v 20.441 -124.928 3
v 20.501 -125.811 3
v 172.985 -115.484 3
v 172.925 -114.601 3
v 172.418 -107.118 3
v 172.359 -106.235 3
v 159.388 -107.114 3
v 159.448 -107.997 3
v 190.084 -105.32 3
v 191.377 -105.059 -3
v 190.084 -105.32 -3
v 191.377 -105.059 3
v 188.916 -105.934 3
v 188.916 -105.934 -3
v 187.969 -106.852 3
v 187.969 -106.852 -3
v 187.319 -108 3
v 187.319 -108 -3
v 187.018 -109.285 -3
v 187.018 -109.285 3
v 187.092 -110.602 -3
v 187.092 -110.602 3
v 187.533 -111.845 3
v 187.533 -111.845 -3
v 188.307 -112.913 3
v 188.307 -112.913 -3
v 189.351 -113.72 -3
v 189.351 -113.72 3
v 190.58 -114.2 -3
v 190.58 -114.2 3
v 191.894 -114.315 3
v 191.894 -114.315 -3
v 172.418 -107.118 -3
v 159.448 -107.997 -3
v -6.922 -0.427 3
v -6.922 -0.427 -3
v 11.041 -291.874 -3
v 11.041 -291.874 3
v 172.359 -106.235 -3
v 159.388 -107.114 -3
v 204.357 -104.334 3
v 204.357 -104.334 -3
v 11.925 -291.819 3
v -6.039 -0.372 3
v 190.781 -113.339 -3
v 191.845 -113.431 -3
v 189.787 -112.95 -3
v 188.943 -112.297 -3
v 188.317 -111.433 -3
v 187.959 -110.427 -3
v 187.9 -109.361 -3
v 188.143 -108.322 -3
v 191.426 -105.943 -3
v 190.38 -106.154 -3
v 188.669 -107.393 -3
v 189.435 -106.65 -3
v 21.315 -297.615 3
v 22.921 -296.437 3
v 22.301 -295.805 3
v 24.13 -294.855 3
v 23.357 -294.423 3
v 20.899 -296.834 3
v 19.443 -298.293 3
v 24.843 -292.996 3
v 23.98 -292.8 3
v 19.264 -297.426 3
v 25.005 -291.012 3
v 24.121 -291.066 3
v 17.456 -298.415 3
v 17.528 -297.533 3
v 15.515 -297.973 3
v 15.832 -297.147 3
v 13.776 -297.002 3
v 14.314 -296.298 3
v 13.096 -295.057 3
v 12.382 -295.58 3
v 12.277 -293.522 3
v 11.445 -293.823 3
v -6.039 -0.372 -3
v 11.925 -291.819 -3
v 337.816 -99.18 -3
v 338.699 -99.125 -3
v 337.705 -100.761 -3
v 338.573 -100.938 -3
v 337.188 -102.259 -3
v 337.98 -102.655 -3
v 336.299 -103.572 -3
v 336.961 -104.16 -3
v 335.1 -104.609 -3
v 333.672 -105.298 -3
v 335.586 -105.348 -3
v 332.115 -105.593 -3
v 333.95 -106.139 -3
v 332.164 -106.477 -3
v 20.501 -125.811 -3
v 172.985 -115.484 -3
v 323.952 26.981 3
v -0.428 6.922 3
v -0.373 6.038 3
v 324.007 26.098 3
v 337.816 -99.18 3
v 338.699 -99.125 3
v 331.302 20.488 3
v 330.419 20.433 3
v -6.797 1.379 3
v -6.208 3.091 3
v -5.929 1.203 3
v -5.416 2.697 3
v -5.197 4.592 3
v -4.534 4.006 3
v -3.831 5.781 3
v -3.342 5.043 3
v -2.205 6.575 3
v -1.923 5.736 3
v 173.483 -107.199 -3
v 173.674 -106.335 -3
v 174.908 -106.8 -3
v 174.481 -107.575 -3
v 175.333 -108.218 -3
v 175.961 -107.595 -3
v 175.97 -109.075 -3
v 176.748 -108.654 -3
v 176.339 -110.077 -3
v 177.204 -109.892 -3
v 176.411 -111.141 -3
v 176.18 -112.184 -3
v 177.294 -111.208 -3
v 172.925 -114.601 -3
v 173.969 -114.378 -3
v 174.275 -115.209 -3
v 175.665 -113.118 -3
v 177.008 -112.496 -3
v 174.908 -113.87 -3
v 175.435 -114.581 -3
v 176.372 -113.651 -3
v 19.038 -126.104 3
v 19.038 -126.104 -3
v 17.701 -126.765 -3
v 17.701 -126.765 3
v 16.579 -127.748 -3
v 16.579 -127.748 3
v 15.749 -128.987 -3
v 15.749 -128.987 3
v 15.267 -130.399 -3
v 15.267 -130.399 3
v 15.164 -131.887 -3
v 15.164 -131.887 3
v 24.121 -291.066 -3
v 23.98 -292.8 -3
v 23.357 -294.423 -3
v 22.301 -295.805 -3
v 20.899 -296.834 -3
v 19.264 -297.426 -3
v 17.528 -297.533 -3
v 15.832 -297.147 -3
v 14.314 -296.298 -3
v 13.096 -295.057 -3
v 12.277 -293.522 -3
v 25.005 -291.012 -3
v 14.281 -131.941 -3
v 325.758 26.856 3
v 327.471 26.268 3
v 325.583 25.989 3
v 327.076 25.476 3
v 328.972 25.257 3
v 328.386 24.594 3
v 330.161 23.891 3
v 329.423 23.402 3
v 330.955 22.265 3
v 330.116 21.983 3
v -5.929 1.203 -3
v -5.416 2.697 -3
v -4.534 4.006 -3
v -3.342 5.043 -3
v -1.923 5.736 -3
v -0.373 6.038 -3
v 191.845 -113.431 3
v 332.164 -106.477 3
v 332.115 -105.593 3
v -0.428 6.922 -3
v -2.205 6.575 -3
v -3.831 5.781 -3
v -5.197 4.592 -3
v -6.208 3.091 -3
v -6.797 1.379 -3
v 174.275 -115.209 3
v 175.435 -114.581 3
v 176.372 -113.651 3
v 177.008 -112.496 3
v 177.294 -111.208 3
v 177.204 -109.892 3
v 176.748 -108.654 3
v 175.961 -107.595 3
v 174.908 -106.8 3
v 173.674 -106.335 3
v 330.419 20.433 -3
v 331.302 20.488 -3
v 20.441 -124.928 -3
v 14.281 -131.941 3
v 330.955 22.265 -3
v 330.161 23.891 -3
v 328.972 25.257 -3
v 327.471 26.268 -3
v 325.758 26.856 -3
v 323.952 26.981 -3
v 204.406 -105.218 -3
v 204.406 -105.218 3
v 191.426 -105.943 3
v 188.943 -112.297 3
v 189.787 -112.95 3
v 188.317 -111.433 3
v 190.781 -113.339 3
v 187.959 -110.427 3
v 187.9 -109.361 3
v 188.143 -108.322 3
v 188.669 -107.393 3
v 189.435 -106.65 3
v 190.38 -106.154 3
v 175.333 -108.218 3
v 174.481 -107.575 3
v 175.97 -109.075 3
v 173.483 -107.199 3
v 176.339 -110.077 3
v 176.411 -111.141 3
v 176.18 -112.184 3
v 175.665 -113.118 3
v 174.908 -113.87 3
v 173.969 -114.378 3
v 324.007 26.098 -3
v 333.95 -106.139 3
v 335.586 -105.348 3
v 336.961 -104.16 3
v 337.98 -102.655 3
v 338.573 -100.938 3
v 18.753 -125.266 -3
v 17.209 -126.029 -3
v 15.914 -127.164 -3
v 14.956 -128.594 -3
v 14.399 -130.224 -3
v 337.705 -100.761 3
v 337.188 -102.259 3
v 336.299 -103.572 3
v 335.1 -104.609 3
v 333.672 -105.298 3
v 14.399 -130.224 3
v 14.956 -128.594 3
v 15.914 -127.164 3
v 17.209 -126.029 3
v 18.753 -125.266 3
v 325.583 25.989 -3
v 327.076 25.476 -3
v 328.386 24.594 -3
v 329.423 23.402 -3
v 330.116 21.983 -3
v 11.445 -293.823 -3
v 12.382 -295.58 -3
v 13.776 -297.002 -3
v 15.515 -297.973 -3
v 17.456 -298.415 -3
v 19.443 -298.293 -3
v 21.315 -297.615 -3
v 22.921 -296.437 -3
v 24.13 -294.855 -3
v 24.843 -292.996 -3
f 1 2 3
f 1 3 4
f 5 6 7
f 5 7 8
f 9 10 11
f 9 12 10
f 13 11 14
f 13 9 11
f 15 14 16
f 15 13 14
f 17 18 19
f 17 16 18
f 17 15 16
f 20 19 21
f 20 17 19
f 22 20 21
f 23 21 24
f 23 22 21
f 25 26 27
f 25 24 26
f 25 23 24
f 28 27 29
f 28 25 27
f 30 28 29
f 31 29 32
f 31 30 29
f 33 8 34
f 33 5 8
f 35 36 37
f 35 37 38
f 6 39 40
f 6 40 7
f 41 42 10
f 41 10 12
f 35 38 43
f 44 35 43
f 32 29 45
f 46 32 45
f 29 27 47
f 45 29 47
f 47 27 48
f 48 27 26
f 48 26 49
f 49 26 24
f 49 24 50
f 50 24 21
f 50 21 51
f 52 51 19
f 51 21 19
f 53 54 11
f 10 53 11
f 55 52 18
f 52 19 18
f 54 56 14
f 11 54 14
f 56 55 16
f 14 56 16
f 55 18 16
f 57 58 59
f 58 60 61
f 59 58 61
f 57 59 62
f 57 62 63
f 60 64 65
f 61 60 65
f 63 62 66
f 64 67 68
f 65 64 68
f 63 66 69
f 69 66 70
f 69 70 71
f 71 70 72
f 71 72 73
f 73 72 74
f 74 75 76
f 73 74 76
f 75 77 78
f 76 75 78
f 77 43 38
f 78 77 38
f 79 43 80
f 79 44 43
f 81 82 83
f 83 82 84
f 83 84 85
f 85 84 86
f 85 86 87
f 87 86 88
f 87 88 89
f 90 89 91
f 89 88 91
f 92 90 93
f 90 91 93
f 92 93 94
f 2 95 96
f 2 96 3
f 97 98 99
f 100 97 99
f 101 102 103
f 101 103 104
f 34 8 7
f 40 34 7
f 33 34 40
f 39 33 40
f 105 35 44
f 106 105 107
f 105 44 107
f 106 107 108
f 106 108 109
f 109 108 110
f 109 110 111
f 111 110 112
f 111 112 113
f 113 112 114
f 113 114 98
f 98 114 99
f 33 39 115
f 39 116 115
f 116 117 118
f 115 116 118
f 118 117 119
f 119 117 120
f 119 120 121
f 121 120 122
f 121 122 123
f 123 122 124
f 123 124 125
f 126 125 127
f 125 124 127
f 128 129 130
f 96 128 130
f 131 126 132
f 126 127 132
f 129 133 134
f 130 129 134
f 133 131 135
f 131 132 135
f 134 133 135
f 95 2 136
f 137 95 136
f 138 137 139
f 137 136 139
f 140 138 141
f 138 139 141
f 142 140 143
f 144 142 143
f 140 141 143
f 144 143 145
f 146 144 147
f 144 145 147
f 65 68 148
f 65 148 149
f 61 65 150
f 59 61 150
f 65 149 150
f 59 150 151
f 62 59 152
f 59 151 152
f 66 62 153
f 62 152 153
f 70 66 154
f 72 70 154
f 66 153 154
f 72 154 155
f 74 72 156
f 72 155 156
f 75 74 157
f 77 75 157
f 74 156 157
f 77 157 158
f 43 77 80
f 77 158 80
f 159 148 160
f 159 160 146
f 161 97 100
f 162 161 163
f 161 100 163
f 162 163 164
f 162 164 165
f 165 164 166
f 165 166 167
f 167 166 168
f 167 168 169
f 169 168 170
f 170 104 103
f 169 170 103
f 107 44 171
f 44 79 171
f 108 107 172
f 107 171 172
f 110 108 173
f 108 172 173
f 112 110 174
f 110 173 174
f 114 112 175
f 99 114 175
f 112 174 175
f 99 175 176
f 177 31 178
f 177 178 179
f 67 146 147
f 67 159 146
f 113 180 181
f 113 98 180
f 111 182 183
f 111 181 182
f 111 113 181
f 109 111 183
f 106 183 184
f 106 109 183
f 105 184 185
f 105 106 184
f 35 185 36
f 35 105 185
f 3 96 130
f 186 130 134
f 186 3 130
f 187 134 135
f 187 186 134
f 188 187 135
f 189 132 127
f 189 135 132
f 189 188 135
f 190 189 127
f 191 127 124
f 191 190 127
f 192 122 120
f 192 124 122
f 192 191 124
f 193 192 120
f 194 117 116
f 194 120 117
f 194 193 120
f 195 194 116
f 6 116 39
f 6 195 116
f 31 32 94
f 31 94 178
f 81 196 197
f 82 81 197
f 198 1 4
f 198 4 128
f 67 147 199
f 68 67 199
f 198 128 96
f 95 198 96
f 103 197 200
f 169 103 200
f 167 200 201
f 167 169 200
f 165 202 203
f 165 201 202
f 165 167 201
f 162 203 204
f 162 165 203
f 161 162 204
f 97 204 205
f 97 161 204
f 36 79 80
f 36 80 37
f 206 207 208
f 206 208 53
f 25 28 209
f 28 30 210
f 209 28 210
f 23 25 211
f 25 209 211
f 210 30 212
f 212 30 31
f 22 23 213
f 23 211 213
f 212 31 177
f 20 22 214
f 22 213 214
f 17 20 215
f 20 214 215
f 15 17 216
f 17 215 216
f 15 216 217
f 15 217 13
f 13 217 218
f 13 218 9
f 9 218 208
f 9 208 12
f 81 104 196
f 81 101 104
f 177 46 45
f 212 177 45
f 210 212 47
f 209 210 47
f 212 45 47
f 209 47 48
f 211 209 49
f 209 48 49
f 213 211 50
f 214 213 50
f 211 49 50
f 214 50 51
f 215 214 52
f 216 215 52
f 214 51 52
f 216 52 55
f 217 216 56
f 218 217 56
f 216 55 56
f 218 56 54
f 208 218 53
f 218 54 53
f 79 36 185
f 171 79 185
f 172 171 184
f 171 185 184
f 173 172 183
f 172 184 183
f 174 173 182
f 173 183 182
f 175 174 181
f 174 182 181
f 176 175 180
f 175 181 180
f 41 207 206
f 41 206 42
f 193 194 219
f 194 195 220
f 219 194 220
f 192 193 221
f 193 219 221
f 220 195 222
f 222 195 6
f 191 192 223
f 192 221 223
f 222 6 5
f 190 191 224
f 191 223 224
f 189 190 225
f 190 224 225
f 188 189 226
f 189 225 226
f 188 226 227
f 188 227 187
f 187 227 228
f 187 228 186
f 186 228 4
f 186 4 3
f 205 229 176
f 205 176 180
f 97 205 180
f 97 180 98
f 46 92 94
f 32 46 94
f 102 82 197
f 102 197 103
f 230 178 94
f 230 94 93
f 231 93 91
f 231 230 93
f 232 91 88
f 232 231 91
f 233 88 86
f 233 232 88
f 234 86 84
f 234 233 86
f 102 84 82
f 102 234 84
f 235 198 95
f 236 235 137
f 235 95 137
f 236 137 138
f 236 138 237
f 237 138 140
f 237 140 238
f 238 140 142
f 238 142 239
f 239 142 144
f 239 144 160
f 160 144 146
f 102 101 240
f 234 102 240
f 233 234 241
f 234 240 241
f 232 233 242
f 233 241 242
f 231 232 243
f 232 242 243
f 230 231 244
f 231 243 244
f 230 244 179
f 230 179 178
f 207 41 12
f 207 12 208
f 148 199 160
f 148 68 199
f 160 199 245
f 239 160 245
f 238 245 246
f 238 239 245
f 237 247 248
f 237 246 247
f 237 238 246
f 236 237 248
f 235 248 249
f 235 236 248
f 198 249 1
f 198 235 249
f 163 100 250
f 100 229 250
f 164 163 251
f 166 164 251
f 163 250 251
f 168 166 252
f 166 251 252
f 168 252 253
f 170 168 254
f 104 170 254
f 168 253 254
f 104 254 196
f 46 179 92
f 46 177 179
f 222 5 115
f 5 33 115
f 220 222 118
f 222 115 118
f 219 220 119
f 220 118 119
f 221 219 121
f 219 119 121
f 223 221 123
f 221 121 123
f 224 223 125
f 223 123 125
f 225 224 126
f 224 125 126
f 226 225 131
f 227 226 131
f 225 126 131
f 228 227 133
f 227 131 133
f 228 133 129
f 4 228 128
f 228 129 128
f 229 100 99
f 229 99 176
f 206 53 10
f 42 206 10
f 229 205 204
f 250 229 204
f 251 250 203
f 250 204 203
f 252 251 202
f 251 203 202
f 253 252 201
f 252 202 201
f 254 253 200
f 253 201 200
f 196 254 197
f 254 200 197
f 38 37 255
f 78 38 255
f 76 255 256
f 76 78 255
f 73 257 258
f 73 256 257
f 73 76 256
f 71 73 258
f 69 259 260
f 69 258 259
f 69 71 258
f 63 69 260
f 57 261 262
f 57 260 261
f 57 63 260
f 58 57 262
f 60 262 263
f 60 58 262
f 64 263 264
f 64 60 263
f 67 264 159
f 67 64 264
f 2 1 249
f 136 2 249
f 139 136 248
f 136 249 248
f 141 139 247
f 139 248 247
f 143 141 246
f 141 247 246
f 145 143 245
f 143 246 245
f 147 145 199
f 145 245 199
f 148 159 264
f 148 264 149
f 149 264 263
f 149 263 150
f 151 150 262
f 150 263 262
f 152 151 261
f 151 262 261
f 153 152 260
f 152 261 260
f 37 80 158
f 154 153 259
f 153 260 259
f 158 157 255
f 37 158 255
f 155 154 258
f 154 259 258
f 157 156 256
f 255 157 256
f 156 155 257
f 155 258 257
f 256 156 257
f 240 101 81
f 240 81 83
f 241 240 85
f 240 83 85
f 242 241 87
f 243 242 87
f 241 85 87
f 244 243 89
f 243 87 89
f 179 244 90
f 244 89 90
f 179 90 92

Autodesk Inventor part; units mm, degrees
ref_plane "YZ Plane" through (0, 0, 0) normal (1, 0, 0) x (0, 1, 0)
ref_plane "XZ Plane" through (0, 0, 0) normal (0, 1, 0) x (-1, 0, 0)
sketch "Sketch1" plane through (0, 0, 0) normal (0, 0, 1) x (1, 0, 0)
  circle A0 centre (0, 0) radius 6.05
surface extrude "ExtrusionSrf1" sketch "Sketch1" along normal mid plane 6 shown yes curves A0
sketch "Sketch2" plane through (0, 0, 0) normal (0, 0, 1) x (1, 0, 0)
  circle A0 centre (324.3803, 20.0598) radius 6.05
  point P0 (0, 0)
surface extrude "ExtrusionSrf2" sketch "Sketch2" along normal mid plane 6 shown yes curves A0
sketch "Sketch3" plane through (0, 0, 0) normal (0, 0, 1) x (1, 0, 0)
  circle A0 centre (18.0229, -291.4433) radius 6.11
  point P0 (0, 0)
surface extrude "ExtrusionSrf3" sketch "Sketch3" along normal blind 6 shown yes curves A0
sketch "Sketch4" plane through (0, 0, 0) normal (0, 0, 1) x (1, 0, 0)
  circle A0 centre (20.8883, -131.5327) radius 5.735
  point P0 (0, 0)
surface extrude "ExtrusionSrf4" sketch "Sketch4" along normal mid plane 6 shown yes curves A0
sketch "Sketch5" plane through (0, 0, 0) normal (0, 0, 1) x (1, 0, 0)
  circle A0 centre (331.7772, -99.5529) radius 6.05
  point P0 (0, 0)
surface extrude "ExtrusionSrf5" sketch "Sketch5" along normal mid plane 6 shown yes curves A0
sketch "Sketch6" plane through (0, 0, 0) normal (0, 0, 1) x (1, 0, 0)
  circle A0 centre (172.6717, -110.8599) radius 3
  point P0 (0, 0)
surface extrude "ExtrusionSrf6" sketch "Sketch6" along normal mid plane 6 shown yes curves A0
sketch "Sketch7" plane through (0, 0, 0) normal (0, 0, 1) x (1, 0, 0)
  circle A0 centre (191.6355, -109.6871) radius 3
  point P0 (0, 0)
surface extrude "ExtrusionSrf7" sketch "Sketch7" along normal mid plane 6 shown yes curves A0
sketch "Sketch8" plane through (0, 0, 0) normal (0, 0, 1) x (1, 0, 0)
  circle A0 centre (0, 0) radius 6.05 projected
  circle A1 centre (20.8883, -131.5327) radius 5.735 projected
  circle A2 centre (18.0229, -291.4433) radius 6.11 projected
  circle A3 centre (172.6717, -110.8599) radius 3 projected
  circle A4 centre (191.6355, -109.6871) radius 3 projected
  circle A5 centre (331.7772, -99.5529) radius 6.05 projected
  circle A6 centre (324.3803, 20.0598) radius 6.05 projected
  arc A7 (-0.3892, 6.293) -> (-6.2931, -0.3879) centre (0, 0) ccw
  arc A8 (11.67, -291.8348) -> (24.3758, -291.0504) centre (18.0229, -291.4433) ccw
  arc A9 (20.4583, -125.1822) -> (14.5355, -131.9256) centre (20.8883, -131.5327) ccw
  arc A10 (172.9424, -114.8557) -> (172.4011, -106.864) centre (172.6717, -110.8599) ccw
  arc A11 (330.6733, 20.4489) -> (323.9912, 26.3527) centre (324.3803, 20.0598) ccw
  arc A12 (191.4121, -105.6884) -> (191.859, -113.6859) centre (191.6355, -109.6871) ccw
  arc A13 (332.129, -105.8481) -> (338.0702, -99.1638) centre (331.7772, -99.5529) ccw
  line L0 (11.67, -291.8348) -> (-6.2931, -0.3879)
  line L1 (-0.3892, 6.293) -> (323.9912, 26.3527)
  line L2 (24.3758, -291.0504) -> (14.5355, -131.9256)
  line L3 (20.4583, -125.1822) -> (172.9424, -114.8557)
  line L4 (330.6733, 20.4489) -> (338.0702, -99.1638)
  line L5 (159.4309, -107.7424) -> (172.4011, -106.864)
  line L6 (191.859, -113.6859) -> (332.129, -105.8481)
  line L7 (191.4121, -105.6884) -> (204.3918, -104.9631)
  dimension "d14" = 0.255
  dimension "d15" = 0.255
  dimension "d16" = 0.255
  dimension "d17" = 0.63
  dimension "d19" = 0.255
  dimension "d22" = 1.005
  dimension "d23" = 1.005
  dimension "d34" = 13
  dimension "d35" = 13
ref_plane "Work Plane2" through (204.3918, -104.9631, 0) normal (0.9984426, 0.0557893, 0) x (-0.0557893, 0.9984426, 0)
sketch "Sketch10" plane through (204.3918, -104.9631, 0) normal (0.9984426, 0.0557893, 0) x (-0.0557893, 0.9984426, 0)
  line L0 (0.63, 3) -> (-0.255, 3)
  line L1 (-0.255, 3) -> (-0.255, -3)
  line L2 (-0.255, -3) -> (0.63, -3)
  line L3 (0.63, -3) -> (0.63, 3)
  line L4 (0.63, 0) -> (-0.255, 0) construction
  point P0 (116.2025, 0)
  point P1 (0, 0)
  dimension "d29" = 6
  dimension "d30" = 0.63
  dimension "d31" = 0.255
sweep "Sweep2" add profiles "Sketch10" path "Sketch8" path curves L7 A12 L6 A13 L4 A11 L1 A7 L0 A8 L2 A9 L3 A10 L5
equation "\"d14\" = inside"
equation "\"d15\" = inside"
equation "\"d16\" = inside"
equation "\"d17\" = backside"
equation "\"d19\" = inside"
equation "\"d30\" = backside"
equation "\"d31\" = inside"
equation "\"inside\" = 0.255"
equation "\"backside\" = 0.63"
properties part number "Belt 4" material "Rubber"
